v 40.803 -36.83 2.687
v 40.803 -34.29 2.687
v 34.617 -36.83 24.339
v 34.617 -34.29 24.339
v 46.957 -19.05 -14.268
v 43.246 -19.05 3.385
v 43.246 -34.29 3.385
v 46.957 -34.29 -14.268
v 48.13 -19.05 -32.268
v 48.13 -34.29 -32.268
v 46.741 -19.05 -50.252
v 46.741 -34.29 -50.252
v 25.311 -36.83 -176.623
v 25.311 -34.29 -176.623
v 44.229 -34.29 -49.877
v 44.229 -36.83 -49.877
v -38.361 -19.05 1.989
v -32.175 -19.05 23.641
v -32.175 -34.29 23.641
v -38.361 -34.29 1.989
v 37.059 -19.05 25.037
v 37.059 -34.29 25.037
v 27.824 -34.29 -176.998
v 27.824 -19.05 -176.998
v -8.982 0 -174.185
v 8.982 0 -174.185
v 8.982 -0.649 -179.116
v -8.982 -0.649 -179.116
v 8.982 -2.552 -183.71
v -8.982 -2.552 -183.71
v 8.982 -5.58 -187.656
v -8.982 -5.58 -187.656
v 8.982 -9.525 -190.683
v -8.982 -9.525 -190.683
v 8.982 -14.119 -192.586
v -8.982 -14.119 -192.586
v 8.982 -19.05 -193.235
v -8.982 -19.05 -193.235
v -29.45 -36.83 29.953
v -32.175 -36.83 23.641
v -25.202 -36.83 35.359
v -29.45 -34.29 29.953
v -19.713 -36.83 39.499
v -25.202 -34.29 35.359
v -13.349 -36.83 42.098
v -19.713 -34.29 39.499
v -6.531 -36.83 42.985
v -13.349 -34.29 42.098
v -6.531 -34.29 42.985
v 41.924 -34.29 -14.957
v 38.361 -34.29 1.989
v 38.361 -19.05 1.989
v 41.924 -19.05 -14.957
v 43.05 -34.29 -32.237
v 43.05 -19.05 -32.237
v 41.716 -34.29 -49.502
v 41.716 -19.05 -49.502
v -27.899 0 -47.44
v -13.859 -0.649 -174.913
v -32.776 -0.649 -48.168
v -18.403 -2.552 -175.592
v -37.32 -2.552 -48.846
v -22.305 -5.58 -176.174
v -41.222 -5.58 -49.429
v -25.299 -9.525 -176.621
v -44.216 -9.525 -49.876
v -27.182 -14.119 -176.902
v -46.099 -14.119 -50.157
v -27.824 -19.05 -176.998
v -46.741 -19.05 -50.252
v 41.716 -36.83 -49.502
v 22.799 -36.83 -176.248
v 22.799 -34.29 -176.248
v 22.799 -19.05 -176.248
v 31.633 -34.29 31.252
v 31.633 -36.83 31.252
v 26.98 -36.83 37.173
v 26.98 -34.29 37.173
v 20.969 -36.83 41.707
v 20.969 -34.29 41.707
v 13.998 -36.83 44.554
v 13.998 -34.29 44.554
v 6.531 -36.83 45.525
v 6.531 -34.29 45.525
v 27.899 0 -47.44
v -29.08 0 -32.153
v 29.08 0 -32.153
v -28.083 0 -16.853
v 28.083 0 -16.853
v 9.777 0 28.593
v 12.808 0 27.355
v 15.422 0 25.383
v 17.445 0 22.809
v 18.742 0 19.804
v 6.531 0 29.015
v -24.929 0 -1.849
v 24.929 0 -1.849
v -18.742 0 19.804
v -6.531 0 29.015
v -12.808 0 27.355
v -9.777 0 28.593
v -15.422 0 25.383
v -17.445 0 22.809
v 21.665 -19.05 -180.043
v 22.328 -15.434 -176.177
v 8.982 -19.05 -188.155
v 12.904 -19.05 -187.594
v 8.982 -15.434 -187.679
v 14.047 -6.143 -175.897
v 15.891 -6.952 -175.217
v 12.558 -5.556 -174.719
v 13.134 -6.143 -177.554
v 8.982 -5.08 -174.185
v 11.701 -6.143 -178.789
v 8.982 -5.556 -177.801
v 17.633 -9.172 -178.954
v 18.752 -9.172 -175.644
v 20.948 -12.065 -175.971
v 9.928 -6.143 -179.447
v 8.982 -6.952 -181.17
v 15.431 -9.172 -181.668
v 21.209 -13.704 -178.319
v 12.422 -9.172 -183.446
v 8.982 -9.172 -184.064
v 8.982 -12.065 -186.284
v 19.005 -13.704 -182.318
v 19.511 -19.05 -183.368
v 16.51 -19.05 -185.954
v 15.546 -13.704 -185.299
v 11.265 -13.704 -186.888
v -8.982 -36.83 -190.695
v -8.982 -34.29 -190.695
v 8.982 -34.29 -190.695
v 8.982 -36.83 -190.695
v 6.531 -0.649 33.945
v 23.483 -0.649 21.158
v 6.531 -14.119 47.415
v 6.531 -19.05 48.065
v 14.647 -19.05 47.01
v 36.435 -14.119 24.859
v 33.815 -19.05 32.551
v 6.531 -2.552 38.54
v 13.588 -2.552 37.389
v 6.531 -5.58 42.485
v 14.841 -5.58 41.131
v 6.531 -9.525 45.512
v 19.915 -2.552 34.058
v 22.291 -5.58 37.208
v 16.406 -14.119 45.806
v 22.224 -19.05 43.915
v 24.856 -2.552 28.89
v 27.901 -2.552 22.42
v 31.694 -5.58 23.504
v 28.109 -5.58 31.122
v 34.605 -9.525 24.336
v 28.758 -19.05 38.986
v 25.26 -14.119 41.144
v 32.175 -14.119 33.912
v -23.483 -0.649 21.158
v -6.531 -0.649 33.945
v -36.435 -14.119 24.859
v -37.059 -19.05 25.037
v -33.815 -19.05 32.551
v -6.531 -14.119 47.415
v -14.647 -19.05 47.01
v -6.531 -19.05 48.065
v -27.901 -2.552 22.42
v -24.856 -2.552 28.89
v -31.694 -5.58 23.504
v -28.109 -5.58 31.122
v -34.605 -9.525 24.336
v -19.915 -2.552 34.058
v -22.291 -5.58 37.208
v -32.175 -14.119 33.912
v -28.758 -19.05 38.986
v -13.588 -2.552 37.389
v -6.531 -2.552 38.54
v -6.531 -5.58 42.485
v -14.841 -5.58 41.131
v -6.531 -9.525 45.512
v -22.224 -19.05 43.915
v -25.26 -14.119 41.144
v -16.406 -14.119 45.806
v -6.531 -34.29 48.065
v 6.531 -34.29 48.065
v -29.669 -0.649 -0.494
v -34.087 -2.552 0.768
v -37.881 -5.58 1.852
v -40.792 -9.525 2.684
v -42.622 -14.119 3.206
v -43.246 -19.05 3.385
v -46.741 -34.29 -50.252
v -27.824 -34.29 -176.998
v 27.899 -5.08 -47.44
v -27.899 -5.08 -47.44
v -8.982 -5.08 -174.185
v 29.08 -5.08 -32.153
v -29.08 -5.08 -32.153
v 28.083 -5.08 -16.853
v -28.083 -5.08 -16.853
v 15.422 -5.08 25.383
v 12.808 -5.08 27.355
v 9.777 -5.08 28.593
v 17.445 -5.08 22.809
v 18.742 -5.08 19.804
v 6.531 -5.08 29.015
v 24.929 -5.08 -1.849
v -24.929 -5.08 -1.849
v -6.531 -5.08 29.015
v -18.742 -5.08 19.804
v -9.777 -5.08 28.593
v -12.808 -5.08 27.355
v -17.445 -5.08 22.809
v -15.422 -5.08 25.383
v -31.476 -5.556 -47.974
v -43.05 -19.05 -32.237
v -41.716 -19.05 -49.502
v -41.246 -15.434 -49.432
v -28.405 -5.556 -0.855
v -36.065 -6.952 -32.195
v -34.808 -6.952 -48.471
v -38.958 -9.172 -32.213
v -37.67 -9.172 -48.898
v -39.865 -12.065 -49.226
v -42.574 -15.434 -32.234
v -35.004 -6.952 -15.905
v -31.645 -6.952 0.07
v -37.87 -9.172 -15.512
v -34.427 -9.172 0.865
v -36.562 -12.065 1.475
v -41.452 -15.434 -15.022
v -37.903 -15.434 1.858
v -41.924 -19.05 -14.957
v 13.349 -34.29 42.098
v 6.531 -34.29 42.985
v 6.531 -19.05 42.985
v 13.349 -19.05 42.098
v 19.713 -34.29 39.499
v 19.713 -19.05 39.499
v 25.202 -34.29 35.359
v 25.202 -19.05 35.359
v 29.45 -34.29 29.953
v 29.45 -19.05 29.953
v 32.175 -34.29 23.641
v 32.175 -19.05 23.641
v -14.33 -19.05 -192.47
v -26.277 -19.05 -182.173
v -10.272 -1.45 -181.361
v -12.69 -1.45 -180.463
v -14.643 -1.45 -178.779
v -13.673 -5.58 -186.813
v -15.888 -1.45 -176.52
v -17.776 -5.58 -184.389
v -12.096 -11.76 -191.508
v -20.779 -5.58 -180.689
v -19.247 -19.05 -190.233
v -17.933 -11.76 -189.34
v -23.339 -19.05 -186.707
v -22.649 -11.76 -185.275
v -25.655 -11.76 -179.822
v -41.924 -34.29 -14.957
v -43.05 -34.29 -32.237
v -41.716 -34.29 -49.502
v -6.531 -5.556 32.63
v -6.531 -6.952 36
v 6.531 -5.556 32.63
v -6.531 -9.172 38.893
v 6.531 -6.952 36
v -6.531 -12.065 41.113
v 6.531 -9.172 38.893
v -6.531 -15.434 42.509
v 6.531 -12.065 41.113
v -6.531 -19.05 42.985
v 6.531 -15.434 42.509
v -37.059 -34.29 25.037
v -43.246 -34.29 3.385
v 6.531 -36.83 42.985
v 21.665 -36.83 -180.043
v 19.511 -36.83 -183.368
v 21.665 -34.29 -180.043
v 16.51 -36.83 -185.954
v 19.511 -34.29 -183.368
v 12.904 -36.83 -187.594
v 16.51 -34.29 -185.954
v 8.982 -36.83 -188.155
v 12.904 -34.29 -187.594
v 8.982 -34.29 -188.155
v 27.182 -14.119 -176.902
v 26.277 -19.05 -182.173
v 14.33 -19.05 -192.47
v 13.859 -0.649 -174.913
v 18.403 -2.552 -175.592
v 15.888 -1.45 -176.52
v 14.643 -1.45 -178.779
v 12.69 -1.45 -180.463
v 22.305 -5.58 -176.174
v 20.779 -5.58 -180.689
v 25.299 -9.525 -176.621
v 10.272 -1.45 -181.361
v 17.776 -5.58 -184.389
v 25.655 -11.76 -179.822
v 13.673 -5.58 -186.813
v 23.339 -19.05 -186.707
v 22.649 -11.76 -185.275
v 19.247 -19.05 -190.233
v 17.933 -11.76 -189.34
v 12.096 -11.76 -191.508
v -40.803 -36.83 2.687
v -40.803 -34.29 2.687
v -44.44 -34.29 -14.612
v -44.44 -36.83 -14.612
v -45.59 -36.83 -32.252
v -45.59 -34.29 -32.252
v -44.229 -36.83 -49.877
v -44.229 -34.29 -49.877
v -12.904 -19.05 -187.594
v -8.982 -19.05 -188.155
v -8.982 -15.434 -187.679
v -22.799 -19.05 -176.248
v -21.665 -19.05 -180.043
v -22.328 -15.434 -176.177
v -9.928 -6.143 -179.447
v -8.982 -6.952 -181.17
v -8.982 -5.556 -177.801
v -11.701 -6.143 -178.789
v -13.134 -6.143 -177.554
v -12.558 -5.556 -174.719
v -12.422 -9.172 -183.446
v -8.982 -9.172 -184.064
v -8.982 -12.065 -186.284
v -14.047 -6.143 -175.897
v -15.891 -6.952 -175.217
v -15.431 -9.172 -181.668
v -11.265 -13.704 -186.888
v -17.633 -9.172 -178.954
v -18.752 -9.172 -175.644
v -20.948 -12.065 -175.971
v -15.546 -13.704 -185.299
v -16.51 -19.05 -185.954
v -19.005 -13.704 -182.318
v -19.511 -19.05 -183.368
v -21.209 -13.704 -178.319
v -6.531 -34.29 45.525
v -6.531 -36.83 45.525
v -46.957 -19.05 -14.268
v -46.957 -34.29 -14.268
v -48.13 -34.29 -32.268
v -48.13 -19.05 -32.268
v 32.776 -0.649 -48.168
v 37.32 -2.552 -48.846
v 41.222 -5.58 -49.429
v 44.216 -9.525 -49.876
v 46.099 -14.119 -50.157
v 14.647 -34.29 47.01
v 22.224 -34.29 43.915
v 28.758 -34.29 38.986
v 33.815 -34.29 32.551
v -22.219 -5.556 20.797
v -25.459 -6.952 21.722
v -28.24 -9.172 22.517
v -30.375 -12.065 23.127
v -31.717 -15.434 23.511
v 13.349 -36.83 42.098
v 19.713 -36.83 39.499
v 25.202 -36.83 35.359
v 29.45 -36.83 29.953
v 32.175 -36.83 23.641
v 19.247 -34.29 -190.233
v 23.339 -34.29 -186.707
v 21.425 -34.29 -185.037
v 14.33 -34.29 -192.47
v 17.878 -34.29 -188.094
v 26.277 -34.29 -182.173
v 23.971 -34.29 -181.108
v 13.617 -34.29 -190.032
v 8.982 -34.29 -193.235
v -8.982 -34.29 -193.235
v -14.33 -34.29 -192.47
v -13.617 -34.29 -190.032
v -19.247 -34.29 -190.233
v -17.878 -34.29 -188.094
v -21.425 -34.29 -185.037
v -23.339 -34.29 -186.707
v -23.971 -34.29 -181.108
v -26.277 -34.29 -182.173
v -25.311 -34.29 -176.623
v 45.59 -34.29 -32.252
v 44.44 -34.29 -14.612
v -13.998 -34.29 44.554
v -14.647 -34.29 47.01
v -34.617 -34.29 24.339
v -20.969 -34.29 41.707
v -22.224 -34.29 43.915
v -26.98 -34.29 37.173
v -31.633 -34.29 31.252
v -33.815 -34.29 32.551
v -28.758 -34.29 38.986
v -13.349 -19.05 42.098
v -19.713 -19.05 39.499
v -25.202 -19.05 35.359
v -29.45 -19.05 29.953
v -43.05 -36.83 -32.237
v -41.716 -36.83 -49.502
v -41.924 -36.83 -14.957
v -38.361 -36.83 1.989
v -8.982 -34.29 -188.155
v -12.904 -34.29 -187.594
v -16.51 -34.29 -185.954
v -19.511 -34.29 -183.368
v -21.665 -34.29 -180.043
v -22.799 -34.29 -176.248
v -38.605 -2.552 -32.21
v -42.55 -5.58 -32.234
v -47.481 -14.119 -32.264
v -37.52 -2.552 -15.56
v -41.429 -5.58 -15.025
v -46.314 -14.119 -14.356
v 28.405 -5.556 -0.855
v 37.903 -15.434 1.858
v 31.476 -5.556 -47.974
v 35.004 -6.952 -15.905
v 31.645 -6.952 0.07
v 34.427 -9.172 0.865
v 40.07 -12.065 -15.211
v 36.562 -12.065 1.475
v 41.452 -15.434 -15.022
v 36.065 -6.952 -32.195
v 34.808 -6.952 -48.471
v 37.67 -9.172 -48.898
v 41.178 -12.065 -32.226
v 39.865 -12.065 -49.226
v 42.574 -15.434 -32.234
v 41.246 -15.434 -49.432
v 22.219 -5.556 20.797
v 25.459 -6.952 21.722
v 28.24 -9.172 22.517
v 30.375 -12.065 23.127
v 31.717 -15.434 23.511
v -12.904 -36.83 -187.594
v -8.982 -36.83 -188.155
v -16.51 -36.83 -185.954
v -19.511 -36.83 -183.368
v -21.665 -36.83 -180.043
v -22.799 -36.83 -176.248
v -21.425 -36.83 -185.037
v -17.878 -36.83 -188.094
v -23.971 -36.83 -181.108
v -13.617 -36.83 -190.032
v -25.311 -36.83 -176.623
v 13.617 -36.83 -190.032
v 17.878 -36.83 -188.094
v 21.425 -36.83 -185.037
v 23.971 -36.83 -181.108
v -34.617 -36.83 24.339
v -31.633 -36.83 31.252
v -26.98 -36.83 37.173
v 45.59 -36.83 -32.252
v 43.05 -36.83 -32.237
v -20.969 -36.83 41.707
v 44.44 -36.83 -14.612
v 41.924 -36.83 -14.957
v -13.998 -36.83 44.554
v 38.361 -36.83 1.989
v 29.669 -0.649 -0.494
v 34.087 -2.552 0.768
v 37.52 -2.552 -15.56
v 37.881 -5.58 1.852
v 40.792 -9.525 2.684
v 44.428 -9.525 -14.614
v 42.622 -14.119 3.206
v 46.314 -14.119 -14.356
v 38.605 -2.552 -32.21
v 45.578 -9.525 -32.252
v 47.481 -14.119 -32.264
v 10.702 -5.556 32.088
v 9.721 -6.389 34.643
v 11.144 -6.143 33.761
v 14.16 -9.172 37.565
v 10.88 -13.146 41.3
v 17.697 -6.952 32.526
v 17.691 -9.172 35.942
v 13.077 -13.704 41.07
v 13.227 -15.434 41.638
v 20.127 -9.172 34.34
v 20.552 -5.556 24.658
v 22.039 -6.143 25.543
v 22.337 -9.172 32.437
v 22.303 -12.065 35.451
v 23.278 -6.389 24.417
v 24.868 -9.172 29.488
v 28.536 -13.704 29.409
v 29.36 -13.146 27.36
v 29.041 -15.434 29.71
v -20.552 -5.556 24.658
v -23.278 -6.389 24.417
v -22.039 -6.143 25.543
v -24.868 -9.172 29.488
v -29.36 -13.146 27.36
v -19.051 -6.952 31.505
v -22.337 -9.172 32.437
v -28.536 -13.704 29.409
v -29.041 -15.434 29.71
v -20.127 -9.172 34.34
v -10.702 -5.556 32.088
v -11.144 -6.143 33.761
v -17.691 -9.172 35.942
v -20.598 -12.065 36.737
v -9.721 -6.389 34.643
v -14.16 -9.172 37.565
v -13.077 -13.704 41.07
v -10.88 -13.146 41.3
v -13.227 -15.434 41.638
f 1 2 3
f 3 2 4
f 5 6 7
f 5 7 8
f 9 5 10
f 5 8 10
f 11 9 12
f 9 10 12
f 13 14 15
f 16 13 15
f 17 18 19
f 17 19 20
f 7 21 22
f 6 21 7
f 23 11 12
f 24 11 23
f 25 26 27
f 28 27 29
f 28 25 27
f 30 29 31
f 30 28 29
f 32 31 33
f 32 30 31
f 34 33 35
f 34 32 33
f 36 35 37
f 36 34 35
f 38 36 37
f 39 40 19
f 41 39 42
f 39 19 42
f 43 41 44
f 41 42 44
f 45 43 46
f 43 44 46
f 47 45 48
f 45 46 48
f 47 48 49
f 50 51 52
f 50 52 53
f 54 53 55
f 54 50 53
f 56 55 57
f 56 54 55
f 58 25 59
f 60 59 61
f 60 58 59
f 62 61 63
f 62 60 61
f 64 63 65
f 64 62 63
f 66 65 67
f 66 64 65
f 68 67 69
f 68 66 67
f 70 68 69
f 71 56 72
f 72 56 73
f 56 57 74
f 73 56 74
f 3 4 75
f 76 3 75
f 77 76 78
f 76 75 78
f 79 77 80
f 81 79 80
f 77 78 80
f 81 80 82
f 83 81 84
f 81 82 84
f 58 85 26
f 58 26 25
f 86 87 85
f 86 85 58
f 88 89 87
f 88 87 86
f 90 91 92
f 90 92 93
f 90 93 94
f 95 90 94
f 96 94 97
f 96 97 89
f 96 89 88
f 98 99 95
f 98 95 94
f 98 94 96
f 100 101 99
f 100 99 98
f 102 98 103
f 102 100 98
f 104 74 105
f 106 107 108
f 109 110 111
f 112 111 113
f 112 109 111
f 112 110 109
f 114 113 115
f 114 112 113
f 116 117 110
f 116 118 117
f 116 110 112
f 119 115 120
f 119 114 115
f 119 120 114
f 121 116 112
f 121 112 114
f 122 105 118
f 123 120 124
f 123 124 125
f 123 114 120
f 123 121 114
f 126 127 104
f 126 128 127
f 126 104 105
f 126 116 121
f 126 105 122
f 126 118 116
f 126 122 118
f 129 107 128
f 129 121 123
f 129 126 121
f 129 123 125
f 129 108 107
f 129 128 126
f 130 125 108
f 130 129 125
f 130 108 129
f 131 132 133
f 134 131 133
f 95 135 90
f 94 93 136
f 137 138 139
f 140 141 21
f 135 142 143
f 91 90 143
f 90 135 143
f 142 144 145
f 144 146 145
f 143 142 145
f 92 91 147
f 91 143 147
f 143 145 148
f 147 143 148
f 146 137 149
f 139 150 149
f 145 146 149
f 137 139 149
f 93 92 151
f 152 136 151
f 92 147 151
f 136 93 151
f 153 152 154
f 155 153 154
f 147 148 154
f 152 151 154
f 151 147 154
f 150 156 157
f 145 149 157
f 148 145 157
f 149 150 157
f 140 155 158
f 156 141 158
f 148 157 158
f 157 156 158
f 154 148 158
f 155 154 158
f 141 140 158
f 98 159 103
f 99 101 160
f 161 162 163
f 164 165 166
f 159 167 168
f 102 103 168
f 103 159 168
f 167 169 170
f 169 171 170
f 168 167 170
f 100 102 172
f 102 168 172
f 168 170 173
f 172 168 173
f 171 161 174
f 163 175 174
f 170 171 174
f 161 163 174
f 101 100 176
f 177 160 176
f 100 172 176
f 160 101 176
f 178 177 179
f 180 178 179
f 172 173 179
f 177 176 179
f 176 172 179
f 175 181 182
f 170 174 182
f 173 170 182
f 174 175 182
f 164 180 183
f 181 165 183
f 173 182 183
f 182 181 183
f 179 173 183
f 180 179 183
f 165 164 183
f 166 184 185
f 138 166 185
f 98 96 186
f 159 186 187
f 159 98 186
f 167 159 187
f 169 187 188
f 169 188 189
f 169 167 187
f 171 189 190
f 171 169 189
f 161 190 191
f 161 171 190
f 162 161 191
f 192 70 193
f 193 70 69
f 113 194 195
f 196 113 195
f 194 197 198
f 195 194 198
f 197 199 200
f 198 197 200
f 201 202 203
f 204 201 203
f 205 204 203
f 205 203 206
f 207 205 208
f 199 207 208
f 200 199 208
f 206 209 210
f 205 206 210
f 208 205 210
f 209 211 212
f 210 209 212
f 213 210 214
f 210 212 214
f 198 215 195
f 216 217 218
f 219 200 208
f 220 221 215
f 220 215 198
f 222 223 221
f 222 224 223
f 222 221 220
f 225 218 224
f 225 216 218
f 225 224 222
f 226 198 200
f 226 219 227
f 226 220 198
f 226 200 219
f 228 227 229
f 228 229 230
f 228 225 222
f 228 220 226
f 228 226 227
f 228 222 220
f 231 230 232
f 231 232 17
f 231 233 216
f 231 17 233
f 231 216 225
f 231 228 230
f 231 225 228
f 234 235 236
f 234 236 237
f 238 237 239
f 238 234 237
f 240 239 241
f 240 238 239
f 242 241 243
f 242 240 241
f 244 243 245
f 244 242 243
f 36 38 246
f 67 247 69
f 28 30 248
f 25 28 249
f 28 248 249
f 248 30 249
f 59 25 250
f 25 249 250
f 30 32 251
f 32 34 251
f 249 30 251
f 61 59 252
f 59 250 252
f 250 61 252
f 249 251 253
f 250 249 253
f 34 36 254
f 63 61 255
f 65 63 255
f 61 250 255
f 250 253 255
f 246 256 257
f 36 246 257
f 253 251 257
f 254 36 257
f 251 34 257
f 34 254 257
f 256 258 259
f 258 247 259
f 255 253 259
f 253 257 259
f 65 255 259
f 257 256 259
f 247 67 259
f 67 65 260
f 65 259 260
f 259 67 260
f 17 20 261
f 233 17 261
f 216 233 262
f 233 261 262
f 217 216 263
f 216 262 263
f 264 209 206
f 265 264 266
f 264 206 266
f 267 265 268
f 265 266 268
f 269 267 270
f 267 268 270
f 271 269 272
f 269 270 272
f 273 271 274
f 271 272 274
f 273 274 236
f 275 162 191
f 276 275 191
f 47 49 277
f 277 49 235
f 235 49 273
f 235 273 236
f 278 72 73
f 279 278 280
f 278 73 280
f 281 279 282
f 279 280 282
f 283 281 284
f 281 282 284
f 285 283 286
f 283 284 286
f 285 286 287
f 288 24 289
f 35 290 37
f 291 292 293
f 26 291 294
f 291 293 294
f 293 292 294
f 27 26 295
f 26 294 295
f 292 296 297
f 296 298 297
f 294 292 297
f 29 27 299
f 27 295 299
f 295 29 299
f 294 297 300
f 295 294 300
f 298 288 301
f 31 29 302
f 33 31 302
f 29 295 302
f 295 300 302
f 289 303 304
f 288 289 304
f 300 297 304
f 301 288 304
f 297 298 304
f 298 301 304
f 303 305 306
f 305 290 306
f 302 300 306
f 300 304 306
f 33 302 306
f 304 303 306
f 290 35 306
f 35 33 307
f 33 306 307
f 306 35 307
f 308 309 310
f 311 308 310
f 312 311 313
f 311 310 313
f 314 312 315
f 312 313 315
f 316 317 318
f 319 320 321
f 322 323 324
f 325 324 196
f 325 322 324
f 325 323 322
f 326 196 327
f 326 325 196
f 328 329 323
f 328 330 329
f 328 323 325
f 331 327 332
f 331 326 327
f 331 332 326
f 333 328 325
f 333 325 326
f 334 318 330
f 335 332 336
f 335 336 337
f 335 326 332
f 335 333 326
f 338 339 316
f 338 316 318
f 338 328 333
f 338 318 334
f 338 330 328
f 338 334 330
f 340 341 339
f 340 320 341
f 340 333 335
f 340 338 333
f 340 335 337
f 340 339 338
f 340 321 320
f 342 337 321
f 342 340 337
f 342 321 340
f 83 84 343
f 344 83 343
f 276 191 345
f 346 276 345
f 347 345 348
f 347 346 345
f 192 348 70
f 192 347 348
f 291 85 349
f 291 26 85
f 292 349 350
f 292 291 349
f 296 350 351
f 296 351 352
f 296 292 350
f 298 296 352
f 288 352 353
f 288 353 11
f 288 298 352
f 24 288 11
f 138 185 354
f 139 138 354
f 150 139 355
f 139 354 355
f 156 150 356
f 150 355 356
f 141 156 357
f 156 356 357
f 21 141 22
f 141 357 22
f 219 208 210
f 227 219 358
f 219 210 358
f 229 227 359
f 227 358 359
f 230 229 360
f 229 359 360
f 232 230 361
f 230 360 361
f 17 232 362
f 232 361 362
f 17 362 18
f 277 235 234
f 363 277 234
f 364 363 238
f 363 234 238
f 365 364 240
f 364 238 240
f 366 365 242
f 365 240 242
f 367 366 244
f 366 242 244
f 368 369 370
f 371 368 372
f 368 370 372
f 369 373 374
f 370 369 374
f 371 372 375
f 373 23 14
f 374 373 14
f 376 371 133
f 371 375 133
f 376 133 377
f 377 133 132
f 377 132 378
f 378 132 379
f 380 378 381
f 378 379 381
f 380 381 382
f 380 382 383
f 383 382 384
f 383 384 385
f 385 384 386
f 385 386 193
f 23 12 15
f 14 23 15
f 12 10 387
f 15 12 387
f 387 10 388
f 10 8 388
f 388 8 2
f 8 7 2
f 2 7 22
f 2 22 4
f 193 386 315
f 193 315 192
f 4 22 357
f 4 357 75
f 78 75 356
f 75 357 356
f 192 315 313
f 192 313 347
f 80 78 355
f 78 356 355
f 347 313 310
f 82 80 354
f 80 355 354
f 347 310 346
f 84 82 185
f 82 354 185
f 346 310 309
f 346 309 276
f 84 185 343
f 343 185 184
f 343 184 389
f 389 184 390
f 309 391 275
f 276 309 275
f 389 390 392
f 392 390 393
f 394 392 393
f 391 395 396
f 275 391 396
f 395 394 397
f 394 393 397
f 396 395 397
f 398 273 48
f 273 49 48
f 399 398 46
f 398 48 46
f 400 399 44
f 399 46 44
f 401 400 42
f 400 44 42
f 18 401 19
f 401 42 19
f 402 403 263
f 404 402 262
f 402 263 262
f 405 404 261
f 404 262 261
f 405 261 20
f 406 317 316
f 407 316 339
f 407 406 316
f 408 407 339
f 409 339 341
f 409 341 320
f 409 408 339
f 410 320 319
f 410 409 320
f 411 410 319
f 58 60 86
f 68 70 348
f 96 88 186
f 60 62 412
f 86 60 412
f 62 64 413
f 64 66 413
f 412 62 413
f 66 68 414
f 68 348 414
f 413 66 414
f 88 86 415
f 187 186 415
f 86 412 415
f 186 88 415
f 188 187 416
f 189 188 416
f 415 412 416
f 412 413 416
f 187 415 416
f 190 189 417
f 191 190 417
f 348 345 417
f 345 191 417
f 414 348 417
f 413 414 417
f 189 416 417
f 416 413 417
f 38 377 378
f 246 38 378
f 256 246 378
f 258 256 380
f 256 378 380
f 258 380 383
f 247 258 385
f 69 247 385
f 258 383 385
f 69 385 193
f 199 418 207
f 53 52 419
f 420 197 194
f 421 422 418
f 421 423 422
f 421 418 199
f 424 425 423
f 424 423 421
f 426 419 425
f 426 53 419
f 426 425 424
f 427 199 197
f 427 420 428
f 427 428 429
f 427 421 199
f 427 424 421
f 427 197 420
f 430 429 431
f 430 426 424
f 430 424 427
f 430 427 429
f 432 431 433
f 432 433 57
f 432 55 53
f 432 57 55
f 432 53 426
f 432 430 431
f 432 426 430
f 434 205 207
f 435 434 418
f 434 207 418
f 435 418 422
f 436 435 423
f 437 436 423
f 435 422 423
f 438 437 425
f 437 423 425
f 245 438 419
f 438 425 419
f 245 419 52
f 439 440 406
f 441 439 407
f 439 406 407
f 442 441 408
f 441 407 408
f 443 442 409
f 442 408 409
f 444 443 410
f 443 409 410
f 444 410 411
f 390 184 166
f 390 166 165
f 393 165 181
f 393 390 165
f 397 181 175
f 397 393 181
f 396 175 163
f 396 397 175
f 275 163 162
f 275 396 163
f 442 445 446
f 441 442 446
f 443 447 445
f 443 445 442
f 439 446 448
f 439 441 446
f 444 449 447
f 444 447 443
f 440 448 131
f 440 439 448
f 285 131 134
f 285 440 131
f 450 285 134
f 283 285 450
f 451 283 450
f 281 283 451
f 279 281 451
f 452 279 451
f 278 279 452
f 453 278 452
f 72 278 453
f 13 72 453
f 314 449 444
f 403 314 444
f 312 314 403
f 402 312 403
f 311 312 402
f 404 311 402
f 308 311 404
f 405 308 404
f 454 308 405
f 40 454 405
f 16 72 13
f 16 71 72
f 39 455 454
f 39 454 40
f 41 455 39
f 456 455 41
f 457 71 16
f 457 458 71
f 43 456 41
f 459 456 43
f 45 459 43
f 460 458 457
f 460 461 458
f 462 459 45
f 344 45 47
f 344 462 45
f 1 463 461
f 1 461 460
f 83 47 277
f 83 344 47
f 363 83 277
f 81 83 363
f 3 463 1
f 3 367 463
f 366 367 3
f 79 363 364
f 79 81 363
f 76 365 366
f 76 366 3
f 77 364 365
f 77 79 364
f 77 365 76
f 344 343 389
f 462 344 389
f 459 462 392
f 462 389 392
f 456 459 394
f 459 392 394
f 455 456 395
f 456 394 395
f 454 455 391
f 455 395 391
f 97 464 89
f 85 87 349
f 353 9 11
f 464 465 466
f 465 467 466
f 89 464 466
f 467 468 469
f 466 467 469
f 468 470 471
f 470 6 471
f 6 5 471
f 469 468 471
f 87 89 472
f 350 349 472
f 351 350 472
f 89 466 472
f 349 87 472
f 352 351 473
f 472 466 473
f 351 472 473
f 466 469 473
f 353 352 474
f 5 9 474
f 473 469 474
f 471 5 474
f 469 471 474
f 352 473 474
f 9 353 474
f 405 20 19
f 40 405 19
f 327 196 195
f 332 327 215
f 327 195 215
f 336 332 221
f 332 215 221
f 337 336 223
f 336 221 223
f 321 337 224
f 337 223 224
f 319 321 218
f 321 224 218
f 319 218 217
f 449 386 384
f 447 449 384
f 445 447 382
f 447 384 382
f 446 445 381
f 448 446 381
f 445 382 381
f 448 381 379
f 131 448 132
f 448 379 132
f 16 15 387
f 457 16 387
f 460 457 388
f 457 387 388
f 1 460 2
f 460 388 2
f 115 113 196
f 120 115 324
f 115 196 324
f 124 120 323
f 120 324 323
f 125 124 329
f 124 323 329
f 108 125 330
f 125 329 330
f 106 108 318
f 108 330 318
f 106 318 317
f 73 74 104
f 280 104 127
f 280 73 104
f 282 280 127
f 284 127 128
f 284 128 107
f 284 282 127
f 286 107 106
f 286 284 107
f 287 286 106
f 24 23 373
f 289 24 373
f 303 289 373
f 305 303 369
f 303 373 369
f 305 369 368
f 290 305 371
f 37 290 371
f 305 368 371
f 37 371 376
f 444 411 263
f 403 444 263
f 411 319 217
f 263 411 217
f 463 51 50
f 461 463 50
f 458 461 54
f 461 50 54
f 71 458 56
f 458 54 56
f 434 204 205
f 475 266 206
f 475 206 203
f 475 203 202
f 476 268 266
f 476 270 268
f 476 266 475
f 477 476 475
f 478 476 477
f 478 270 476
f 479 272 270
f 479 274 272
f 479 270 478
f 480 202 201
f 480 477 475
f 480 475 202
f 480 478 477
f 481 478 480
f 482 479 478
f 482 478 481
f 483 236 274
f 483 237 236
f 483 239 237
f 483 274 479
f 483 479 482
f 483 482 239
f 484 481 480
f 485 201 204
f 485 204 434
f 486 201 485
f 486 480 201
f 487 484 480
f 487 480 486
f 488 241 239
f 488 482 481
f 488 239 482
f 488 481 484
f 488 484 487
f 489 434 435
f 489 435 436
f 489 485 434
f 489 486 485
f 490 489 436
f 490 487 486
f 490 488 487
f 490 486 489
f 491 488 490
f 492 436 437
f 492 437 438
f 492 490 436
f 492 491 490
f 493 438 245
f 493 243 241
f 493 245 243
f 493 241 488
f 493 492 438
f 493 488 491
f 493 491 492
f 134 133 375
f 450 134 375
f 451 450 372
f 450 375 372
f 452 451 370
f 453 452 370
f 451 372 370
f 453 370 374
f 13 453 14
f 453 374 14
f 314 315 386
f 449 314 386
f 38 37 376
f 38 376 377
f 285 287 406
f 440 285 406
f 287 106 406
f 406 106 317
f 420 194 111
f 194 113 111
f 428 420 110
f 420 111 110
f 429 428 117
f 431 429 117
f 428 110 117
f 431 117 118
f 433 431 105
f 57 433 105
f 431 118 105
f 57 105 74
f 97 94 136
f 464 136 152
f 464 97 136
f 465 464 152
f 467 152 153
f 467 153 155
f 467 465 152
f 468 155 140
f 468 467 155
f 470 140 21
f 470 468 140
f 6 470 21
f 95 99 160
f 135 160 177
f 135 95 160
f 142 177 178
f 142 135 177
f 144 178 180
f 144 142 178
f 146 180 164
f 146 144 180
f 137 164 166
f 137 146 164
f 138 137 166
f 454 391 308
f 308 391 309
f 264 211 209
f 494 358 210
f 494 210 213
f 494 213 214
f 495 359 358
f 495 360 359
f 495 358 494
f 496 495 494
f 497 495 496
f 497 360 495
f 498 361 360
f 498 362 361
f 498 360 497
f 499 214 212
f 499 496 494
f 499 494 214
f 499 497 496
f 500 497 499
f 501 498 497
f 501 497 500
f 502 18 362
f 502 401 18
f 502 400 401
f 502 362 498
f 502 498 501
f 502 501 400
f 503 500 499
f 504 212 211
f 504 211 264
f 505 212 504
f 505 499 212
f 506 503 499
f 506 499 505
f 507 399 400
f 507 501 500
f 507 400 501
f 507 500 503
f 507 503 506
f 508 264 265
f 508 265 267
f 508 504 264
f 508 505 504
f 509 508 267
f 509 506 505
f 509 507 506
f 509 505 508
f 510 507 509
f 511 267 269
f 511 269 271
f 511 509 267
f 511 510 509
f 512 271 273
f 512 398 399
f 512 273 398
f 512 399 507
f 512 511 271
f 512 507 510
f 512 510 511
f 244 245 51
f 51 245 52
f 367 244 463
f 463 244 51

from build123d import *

# Parameters (mm, degrees)
F1_DEPTH = 34.29
F3_R     = 31.75
F4_R     = 127
F5_R     = 19.05
F6_R     = 19.05
F7_T     = -5.08
F9_DEPTH = 2.54


with BuildPart() as f1:
    # F0 (on Front) → F1 (new body)
    with BuildSketch(Plane.XZ):
        Polygon((0, -193.235434227), (0, 48.064565773), (-30.48, 48.064565773), (-50.8, -23.055434227), (-25.4, -193.235434227), align=None)
    extrude(amount=F1_DEPTH)

    # F2: F1 across face


with BuildPart() as f1_1:
    add(f1.part)
    add(f1.part.mirror(Plane(origin=(0, -17.145, -72.585434227), x_dir=(0, 1, 0), z_dir=(1, 0, 0))))

    # F3
    f3_edges = [f1_1.edges().sort_by_distance(p)[0] for p in [
        (-30.48, -17.145, 48.064566),
        (30.48, -17.145, 48.064566),
    ]]
    fillet(f3_edges, radius=F3_R)

    # F4
    f4_edges = [f1_1.edges().sort_by_distance(p)[0] for p in [
        (-50.8, -17.145, -23.055434),
        (50.8, -17.145, -23.055434),
    ]]
    fillet(f4_edges, radius=F4_R)

    # F5
    f5_edges = [f1_1.edges().sort_by_distance(p)[0] for p in [
        (-25.4, -17.145, -193.235434),
        (25.4, -17.145, -193.235434),
    ]]
    fillet(f5_edges, radius=F5_R)

    # F6
    f6_edges = [f1_1.edges().sort_by_distance(p)[0] for p in [
        (37.282158, 0, -113.624977),
    ]]
    fillet(f6_edges, radius=F6_R)

    # F7
    f7_openings = [f1_1.faces().sort_by_distance(p)[0] for p in [
        (0, -34.29, -66.112083),
    ]]
    offset(amount=F7_T, openings=f7_openings)

    # F8 (on face) → F9 (join)
    with BuildSketch(Plane.XZ.offset(34.29)):
        with BuildLine():
            Line((6.530930145, 45.524565773), (-6.530930145, 45.524565773))
            ThreePointArc((-6.530930145, 45.524565773), (-24.121061084, 39.6343297845), (-34.6170446556, 24.3391699189))
            Line((-34.6170446556, 24.3391699189), (-40.8033894121, 2.6869632712))
            ThreePointArc((-40.8033894121, 2.6869632712), (-45.3287249612, -23.411952422), (-44.2285808171, -49.8774345649))
            Line((-44.2285808171, -49.8774345649), (-25.3113894552, -176.6226166898))
            ThreePointArc((-25.3113894552, -176.6226166898), (-19.7605371668, -186.6917922592), (-8.9822669545, -190.695434227))
            Line((-8.9822669545, -190.695434227), (8.9822669545, -190.695434227))
            ThreePointArc((8.9822669545, -190.695434227), (19.7605371668, -186.6917922592), (25.3113894552, -176.6226166898))
            Line((25.3113894552, -176.6226166898), (44.2285808171, -49.8774345649))
            ThreePointArc((44.2285808171, -49.8774345649), (45.3287249612, -23.411952422), (40.8033894121, 2.6869632712))
            Line((40.8033894121, 2.6869632712), (34.6170446556, 24.3391699189))
            ThreePointArc((34.6170446556, 24.3391699189), (24.121061084, 39.6343297845), (6.530930145, 45.524565773))
        make_face()
        with BuildLine():
            ThreePointArc((-32.1747738286, 23.641378254), (-22.5914844806, 37.6065242183), (-6.530930145, 42.984565773))
            Line((-6.530930145, 42.984565773), (6.530930145, 42.984565773))
            ThreePointArc((6.530930145, 42.984565773), (22.5914844806, 37.6065242183), (32.1747738286, 23.641378254))
            Line((32.1747738286, 23.641378254), (38.3611185851, 1.9891716064))
            ThreePointArc((38.3611185851, 1.9891716064), (42.7941003475, -23.5771131543), (41.7164081247, -49.5024834167))
            Line((41.7164081247, -49.5024834167), (22.7992167628, -176.2476655417))
            ThreePointArc((22.7992167628, -176.2476655417), (18.1023417495, -184.7677371773), (8.9822669545, -188.155434227))
            Line((8.9822669545, -188.155434227), (-8.9822669545, -188.155434227))
            ThreePointArc((-8.9822669545, -188.155434227), (-18.1023417495, -184.7677371773), (-22.7992167628, -176.2476655417))
            Line((-22.7992167628, -176.2476655417), (-41.7164081247, -49.5024834167))
            ThreePointArc((-41.7164081247, -49.5024834167), (-42.7941003475, -23.5771131543), (-38.3611185851, 1.9891716064))
            Line((-38.3611185851, 1.9891716064), (-32.1747738286, 23.641378254))
        make_face(mode=Mode.SUBTRACT)
    extrude(amount=F9_DEPTH)


solid = f1_1.part
